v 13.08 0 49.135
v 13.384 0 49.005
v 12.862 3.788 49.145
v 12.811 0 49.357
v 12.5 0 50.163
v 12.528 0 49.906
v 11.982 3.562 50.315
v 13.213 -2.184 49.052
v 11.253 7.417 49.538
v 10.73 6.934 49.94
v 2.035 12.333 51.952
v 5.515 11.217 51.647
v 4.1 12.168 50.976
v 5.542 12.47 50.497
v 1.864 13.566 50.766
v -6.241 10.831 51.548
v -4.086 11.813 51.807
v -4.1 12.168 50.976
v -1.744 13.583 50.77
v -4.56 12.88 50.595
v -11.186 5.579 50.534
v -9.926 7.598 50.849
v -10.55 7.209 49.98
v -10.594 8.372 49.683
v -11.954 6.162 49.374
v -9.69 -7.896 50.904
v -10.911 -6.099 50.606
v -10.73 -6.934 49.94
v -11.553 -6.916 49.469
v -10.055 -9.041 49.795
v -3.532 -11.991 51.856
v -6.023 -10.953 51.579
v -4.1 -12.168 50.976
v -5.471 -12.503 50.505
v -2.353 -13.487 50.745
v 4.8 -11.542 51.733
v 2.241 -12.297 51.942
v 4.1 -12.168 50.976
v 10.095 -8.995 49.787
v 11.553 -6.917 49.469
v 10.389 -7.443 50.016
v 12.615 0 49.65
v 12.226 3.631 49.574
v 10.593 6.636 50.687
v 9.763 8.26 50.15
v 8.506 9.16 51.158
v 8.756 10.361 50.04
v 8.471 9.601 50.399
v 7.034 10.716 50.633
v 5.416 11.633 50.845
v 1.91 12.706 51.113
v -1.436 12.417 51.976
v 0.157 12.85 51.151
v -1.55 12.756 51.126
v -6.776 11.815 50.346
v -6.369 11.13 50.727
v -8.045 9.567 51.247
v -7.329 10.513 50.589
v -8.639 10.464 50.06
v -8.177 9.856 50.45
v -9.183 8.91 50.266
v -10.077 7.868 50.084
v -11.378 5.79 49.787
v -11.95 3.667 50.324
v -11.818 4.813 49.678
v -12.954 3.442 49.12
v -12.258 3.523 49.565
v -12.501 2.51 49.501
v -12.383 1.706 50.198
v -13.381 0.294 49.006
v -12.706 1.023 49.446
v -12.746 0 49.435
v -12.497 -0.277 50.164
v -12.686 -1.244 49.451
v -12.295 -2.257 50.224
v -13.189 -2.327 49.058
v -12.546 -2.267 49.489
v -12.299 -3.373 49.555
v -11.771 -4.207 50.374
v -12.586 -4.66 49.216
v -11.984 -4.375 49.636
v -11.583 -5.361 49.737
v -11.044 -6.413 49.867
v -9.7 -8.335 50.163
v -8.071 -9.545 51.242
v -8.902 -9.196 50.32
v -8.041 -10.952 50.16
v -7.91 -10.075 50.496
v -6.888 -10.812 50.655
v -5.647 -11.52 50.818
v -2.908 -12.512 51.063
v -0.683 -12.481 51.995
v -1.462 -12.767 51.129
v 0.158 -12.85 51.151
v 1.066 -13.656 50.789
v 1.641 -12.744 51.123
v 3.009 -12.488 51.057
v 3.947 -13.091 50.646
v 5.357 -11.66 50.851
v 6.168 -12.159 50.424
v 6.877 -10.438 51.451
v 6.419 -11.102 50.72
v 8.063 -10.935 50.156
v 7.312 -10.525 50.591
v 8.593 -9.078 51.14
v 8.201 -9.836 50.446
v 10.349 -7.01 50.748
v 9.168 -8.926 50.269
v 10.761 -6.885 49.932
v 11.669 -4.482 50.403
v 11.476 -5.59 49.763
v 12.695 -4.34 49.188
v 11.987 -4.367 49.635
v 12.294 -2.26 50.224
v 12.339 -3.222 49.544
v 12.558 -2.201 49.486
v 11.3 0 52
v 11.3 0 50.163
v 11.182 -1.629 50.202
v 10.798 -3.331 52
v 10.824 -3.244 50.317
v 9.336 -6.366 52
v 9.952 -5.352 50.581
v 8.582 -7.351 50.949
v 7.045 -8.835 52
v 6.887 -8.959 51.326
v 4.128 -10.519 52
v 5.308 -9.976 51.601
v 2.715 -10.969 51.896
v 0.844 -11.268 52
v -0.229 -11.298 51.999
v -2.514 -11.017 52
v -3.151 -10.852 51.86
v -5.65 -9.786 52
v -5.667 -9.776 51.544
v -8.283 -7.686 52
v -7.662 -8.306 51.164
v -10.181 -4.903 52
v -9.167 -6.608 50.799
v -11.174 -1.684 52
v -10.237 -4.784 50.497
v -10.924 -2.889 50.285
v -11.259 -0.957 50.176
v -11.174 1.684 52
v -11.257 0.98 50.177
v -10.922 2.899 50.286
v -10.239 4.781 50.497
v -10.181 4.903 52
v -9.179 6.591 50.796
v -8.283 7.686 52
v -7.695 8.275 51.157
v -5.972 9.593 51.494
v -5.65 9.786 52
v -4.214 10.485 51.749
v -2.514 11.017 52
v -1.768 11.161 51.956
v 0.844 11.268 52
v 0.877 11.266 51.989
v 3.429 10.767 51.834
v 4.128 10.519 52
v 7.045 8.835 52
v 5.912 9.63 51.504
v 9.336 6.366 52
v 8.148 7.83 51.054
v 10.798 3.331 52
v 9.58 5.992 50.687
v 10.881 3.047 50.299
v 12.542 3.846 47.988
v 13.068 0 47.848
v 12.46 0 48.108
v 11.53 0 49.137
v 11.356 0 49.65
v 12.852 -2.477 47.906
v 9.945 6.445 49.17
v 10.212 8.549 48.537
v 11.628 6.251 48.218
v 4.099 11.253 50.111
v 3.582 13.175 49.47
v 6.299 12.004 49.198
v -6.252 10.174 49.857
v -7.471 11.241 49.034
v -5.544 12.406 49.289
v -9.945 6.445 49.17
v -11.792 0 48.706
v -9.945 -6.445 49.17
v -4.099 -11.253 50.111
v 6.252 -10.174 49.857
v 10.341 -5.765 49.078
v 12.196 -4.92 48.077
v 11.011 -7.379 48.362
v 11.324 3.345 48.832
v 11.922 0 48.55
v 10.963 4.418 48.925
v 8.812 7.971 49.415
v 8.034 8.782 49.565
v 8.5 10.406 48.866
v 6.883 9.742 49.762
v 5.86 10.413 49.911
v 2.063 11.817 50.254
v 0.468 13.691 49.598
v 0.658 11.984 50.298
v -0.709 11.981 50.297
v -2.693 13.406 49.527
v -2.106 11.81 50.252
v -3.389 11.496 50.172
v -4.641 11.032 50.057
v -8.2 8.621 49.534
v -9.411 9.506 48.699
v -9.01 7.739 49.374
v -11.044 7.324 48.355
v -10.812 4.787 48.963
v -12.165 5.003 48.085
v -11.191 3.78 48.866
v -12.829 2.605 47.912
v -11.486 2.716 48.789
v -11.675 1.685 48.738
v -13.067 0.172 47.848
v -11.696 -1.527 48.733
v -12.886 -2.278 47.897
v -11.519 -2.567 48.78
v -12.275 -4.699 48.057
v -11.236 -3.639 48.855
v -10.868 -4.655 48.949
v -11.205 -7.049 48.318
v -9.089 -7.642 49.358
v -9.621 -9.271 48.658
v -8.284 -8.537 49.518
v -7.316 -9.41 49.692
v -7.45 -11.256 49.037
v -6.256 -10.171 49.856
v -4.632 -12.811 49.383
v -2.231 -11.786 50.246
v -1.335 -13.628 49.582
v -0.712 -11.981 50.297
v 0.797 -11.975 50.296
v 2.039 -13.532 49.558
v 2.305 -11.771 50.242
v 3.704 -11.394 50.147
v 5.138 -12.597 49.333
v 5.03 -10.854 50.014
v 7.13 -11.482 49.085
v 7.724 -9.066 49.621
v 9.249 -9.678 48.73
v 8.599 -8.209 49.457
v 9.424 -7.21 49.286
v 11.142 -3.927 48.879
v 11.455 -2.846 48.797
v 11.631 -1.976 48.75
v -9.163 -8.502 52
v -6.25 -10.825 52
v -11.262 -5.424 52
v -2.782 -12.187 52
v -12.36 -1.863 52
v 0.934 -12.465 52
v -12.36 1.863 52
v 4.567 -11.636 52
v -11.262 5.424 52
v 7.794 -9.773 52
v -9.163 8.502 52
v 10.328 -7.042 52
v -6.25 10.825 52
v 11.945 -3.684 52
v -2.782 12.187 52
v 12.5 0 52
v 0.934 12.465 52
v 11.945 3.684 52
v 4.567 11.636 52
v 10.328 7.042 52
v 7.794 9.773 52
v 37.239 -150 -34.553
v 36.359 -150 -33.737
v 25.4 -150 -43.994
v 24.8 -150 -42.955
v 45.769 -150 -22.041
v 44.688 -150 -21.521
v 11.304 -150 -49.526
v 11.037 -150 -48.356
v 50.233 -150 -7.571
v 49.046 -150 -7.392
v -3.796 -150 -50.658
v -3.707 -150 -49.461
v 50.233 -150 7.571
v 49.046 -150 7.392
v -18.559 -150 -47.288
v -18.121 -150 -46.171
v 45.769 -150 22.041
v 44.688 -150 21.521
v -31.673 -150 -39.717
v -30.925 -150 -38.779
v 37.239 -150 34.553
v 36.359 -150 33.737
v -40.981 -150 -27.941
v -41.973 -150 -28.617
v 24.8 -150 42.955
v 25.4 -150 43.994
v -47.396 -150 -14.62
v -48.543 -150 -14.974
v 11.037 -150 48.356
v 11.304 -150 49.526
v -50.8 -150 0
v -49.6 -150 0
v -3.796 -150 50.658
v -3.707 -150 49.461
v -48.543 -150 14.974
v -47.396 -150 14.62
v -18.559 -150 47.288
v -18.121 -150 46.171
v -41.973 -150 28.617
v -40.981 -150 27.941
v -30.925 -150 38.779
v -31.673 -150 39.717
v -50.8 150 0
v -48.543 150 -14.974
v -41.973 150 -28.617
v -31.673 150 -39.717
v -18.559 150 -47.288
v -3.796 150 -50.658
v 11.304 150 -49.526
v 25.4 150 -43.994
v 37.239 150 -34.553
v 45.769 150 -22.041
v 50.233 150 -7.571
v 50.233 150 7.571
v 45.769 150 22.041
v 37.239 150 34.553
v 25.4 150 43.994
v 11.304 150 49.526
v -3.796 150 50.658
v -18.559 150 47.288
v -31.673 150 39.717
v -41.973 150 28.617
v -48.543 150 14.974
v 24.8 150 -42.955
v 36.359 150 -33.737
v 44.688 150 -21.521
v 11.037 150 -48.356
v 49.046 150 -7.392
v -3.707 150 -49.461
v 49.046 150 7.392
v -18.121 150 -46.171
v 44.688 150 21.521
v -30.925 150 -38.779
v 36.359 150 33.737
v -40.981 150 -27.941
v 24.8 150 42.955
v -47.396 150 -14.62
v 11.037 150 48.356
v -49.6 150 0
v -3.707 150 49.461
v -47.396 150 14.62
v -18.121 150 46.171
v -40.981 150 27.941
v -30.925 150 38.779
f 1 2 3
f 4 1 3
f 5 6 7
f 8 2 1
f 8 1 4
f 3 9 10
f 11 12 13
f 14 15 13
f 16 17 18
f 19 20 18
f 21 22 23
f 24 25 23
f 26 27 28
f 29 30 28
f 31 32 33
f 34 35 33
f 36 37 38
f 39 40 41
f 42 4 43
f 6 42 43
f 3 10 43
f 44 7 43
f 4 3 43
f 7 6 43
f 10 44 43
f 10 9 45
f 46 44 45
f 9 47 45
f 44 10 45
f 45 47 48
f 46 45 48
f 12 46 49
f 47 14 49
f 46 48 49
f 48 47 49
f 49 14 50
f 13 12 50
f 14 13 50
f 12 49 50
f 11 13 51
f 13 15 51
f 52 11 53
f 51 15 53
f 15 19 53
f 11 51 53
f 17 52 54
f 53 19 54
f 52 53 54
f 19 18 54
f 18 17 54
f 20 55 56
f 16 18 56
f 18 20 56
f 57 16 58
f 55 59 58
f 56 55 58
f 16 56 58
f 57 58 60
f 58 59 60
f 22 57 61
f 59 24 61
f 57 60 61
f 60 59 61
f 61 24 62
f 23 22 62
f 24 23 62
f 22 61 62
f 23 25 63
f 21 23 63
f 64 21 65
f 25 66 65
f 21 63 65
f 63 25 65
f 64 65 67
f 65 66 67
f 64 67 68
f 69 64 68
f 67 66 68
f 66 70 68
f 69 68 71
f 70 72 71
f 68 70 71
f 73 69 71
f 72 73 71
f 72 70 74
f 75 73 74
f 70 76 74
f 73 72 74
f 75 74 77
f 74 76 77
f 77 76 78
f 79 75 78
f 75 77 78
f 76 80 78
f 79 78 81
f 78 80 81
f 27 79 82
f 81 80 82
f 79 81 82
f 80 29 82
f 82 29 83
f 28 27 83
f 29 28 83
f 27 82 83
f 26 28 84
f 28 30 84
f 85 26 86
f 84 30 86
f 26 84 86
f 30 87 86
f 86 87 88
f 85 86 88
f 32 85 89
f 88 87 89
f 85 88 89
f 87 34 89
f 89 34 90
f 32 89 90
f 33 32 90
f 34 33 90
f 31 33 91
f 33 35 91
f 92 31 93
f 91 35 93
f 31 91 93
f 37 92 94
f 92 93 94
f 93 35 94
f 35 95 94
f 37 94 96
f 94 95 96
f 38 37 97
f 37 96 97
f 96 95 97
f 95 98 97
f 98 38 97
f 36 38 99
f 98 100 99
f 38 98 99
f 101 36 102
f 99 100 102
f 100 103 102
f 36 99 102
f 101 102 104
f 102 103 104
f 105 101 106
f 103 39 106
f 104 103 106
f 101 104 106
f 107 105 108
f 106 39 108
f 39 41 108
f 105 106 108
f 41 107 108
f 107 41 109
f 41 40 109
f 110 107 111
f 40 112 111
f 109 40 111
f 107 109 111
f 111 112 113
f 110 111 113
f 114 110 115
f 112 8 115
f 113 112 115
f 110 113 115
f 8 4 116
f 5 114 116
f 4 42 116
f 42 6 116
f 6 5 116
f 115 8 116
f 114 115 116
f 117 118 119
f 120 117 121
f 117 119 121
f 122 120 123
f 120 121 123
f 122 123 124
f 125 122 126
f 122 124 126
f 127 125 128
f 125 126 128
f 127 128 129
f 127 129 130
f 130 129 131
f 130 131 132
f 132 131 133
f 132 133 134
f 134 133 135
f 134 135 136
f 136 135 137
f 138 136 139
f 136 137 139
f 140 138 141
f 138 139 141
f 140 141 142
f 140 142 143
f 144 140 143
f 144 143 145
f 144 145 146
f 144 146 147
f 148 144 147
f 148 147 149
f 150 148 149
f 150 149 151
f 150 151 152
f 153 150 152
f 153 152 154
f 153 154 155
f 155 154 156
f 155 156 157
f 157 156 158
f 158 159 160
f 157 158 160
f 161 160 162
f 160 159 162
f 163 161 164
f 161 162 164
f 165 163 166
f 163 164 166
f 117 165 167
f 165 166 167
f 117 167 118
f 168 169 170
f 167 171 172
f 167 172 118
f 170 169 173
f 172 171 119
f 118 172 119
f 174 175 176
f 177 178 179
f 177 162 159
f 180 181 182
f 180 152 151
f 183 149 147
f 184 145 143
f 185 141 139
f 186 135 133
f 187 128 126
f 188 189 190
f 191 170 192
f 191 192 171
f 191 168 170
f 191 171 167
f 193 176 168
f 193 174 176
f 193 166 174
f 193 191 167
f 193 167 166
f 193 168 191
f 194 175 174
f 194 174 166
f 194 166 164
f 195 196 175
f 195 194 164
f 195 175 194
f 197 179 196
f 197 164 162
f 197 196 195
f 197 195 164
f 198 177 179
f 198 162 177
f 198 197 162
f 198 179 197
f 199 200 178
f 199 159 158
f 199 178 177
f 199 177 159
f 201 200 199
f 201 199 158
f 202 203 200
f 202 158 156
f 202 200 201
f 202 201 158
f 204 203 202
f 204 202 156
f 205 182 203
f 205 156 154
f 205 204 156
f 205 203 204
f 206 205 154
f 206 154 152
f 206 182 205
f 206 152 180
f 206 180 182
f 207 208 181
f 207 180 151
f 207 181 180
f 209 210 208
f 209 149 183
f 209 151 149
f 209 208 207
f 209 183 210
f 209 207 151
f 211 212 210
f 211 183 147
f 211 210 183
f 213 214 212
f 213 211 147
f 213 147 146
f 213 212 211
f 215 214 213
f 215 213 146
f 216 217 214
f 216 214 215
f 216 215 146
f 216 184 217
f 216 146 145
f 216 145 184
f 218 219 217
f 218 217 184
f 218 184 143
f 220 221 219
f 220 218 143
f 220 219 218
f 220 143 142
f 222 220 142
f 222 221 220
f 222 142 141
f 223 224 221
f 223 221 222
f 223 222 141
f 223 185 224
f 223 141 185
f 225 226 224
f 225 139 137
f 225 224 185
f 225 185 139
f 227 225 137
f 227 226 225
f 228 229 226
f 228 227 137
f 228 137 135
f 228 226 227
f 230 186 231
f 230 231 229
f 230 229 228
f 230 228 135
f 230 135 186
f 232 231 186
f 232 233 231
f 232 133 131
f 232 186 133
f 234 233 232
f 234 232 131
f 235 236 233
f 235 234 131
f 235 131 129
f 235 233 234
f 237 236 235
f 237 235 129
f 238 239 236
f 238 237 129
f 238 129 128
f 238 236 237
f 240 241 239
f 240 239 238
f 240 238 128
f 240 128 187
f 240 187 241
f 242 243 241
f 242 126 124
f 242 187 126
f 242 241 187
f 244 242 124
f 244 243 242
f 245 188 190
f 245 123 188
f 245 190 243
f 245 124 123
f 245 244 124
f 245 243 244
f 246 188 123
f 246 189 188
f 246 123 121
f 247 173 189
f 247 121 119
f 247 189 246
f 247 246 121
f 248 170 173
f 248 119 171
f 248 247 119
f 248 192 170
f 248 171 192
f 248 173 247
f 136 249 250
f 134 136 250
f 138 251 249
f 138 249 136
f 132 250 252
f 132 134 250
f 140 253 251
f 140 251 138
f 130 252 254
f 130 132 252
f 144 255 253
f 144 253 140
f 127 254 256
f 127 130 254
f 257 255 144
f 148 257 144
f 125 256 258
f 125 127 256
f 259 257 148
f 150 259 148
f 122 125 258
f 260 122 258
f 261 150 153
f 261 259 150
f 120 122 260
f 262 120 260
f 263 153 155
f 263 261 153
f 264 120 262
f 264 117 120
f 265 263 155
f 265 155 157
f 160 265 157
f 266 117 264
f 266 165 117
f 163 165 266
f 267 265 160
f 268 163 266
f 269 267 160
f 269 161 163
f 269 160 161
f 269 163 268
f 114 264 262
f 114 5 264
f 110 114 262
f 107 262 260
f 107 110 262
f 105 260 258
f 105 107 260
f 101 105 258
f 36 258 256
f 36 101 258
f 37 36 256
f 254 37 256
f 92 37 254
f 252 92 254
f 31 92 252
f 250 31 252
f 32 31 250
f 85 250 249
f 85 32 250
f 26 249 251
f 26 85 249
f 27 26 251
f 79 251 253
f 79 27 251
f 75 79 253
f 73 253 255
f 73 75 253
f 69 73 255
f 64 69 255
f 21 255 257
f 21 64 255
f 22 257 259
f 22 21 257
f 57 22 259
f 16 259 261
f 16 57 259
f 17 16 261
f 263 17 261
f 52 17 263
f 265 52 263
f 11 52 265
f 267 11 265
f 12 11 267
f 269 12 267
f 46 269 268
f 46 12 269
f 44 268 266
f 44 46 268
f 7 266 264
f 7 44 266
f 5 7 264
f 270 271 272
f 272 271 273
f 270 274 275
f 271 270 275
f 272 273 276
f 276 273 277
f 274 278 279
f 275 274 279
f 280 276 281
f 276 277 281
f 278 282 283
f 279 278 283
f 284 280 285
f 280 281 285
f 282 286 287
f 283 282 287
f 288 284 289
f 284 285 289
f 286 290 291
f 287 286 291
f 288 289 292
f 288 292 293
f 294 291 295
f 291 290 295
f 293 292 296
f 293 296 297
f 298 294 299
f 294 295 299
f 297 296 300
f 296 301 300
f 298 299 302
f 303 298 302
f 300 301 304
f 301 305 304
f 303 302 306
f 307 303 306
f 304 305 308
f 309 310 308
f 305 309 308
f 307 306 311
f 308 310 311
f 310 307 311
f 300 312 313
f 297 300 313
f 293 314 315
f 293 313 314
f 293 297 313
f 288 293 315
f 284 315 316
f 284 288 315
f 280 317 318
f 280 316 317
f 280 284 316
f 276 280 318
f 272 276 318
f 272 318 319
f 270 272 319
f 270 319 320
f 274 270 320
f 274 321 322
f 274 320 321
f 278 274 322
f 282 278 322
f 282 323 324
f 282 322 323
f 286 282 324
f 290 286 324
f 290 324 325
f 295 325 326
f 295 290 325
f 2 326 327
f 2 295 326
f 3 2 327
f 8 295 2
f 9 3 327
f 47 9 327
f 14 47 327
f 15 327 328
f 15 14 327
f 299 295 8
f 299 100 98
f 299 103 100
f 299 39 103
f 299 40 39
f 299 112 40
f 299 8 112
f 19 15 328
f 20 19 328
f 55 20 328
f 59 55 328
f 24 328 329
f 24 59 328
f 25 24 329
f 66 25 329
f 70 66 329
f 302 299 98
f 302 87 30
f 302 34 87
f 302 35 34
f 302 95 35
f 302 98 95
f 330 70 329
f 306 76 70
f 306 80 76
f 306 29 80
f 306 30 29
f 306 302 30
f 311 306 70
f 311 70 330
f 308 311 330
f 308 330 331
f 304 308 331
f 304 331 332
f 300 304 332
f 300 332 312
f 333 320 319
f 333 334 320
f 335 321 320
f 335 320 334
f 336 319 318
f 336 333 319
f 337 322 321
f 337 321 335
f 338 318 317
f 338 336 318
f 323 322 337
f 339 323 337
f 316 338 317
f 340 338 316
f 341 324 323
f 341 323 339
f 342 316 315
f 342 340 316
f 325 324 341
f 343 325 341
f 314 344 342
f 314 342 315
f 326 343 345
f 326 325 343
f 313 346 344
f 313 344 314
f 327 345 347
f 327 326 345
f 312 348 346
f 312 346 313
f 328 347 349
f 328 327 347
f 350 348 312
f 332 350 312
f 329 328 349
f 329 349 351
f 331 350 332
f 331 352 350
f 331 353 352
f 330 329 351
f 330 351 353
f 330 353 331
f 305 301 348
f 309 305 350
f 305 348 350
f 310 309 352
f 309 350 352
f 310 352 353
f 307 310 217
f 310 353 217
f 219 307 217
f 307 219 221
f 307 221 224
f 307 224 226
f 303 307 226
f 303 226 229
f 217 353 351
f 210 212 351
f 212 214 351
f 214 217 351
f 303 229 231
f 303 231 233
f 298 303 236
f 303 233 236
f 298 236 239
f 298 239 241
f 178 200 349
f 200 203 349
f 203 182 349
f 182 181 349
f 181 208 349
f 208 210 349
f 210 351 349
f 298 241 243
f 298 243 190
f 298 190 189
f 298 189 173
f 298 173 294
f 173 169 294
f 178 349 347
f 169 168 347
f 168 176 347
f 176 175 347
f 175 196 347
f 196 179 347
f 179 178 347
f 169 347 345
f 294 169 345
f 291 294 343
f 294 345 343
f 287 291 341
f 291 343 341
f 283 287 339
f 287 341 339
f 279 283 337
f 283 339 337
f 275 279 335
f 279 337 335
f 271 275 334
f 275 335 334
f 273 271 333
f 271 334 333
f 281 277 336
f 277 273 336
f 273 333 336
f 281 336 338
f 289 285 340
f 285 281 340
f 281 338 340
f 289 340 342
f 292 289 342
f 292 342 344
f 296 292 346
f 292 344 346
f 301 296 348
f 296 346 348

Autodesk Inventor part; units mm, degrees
ref_plane "YZ Plane" through (0, 0, 0) normal (1, 0, 0) x (0, 1, 0)
ref_plane "XZ Plane" through (0, 0, 0) normal (0, 1, 0) x (-1, 0, 0)
ref_plane "XY Plane" through (0, 0, 0) normal (0, 0, 1) x (1, 0, 0)
sketch "Szkic8" plane through (0, 0, 0) normal (0, 1, 0) x (-1, 0, 0)
  circle A0 centre (0, 0) radius 50.8
  circle A1 centre (0, 0) radius 49.6
  dimension "d53" = 101.6
  dimension "d54" = 1.2
extrude "Wyciągnięcie proste2" add sketch "Szkic8" along normal mid plane 300
sketch "Szkic13" plane through (0, 0, 0) normal (0, 0, 1) x (1, 0, 0)
  circle A0 centre (0, 0) radius 12.5
  circle A1 centre (0, 0) radius 11.3
  dimension "d67" = 25
  dimension "d68" = 1.2
extrude "Wyciągnięcie proste6" add sketch "Szkic13" along normal blind 52
sketch "Szkic14" plane through (0, 0, 52) normal (0, 0, 1) x (1, 0, 0)
  circle A0 centre (0, 0) radius 11.3 projected
extrude "Wyciągnięcie proste7" cut sketch "Szkic14" against normal blind 52
sketch "Szkic15" plane through (0, -150, 0) normal (0, -1, 0) x (1, 0, 0)
  circle A0 centre (0, 0) radius 49.6 projected
extrude "Wyciągnięcie proste8" cut sketch "Szkic15" against normal blind 300
fillet "Zaokrąglenie3" radius 1.2 2 edges at (0, 12.5, 50.8) (-0.0026, -12.5, 50.8)
fillet "Zaokrąglenie4" radius 2.4 2 edges at (0.0388, -11.2999, 49.6) (-0.0376, 11.2999, 49.6)
equation "\"d53\" = OD"
equation "\"d54\" = THK"
equation "\"d55\" = L1"
equation "\"d67\" = OD2"
equation "\"d68\" = THK"
equation "\"d69\" = L2"
equation "\"d71\" = L2"
equation "\"d73\" = L1"
equation "\"d75\" = THK"
equation "\"d76\" = 2 * THK"
equation "\"SzerokośćGięciaPodcięcia\" = Grubość"
equation "\"RozmiarPodcięciaNarożnika\" = 4 * Grubość"
equation "\"PromieńPrzejścia\" = PromieńGięcia"
equation "\"Rozmiar_promienia_Jacobiego\" = PromieńGięcia"
equation "\"Wielk_odstępu\" = Grubość"
equation "\"d2\" = PromieńGięcia"
equation "\"d23\" = PromieńGięcia"
equation "\"OD\" = 101.6"
equation "\"THK\" = 1.2"
equation "\"L1\" = 300"
equation "\"L2\" = 52"
equation "\"OD2\" = 25"
equation "\"Grubość\" = 1.5"
equation "\"PromieńGięcia\" = 3"
properties part number "Trójnik red. krótki  Ø101,6 25 101,6 s=1,2 L=300" material "304"
